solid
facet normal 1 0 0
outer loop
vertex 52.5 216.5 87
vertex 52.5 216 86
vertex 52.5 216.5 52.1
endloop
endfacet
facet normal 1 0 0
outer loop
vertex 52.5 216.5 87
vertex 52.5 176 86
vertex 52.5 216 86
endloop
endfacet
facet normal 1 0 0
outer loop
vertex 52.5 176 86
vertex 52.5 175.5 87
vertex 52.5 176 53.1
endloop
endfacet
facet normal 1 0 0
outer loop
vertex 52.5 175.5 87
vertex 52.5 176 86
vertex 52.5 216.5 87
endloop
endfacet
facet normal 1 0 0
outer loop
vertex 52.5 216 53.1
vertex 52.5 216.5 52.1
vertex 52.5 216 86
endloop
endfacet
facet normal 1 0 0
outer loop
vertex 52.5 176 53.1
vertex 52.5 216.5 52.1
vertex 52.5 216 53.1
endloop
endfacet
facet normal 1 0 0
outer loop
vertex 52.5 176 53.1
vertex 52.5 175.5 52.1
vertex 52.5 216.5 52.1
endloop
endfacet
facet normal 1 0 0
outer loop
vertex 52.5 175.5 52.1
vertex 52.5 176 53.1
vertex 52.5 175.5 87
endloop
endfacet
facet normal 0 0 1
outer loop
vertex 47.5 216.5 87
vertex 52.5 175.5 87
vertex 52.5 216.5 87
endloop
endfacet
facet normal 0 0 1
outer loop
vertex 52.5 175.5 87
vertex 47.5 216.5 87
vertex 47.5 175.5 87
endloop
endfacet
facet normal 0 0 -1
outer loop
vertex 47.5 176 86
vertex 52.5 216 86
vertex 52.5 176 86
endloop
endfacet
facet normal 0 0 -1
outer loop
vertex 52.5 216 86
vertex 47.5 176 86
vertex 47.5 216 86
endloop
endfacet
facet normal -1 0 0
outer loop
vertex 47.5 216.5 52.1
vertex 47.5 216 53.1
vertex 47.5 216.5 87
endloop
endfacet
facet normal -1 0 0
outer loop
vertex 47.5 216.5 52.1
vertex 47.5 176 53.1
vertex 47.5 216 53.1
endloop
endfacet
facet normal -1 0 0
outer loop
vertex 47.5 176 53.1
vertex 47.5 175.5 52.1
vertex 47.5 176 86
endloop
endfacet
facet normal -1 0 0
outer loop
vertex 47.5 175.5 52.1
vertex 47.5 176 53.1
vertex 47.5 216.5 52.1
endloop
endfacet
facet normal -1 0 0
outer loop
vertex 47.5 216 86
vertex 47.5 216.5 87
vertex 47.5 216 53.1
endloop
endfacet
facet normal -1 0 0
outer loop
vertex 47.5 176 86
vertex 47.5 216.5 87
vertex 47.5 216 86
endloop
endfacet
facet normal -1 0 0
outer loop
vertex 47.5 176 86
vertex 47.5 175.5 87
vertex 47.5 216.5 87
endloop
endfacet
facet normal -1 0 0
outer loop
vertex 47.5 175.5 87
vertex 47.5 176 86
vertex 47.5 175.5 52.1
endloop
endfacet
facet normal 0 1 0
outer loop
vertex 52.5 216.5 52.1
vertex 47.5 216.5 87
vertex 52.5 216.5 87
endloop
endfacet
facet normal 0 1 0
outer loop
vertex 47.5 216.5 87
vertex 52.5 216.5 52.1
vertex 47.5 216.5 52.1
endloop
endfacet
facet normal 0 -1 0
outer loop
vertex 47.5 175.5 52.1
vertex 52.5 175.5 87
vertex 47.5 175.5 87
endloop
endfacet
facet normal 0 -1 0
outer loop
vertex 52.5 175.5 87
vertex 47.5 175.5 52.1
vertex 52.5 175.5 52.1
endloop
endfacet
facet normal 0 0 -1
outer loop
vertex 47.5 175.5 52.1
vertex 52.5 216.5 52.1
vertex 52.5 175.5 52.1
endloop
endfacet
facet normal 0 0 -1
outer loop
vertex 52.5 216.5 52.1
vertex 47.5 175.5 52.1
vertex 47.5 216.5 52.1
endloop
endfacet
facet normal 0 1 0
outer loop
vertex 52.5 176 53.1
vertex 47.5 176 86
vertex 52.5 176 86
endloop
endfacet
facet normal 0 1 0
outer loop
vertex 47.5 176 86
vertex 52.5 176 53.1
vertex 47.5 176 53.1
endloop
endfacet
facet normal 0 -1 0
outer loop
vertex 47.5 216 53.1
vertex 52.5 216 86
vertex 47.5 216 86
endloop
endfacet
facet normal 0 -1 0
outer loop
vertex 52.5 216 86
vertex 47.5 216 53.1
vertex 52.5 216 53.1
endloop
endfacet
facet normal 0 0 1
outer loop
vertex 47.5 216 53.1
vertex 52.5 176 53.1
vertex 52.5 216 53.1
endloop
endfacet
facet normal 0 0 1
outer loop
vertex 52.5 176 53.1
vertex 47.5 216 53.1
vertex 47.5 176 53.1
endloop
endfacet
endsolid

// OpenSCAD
// Generated from the same CSG operations as STEP. Rebuild with spec/build_parent_hand_service.py.
union(){union(){union(){translate([47.5,175.5,86]) cube([5,41,1]);translate([47.5,175.5,52.1]) cube([5,0.5,34.9]);}translate([47.5,216,52.1]) cube([5,0.5,34.9]);}translate([47.5,175.5,52.1]) cube([5,41,1]);}
